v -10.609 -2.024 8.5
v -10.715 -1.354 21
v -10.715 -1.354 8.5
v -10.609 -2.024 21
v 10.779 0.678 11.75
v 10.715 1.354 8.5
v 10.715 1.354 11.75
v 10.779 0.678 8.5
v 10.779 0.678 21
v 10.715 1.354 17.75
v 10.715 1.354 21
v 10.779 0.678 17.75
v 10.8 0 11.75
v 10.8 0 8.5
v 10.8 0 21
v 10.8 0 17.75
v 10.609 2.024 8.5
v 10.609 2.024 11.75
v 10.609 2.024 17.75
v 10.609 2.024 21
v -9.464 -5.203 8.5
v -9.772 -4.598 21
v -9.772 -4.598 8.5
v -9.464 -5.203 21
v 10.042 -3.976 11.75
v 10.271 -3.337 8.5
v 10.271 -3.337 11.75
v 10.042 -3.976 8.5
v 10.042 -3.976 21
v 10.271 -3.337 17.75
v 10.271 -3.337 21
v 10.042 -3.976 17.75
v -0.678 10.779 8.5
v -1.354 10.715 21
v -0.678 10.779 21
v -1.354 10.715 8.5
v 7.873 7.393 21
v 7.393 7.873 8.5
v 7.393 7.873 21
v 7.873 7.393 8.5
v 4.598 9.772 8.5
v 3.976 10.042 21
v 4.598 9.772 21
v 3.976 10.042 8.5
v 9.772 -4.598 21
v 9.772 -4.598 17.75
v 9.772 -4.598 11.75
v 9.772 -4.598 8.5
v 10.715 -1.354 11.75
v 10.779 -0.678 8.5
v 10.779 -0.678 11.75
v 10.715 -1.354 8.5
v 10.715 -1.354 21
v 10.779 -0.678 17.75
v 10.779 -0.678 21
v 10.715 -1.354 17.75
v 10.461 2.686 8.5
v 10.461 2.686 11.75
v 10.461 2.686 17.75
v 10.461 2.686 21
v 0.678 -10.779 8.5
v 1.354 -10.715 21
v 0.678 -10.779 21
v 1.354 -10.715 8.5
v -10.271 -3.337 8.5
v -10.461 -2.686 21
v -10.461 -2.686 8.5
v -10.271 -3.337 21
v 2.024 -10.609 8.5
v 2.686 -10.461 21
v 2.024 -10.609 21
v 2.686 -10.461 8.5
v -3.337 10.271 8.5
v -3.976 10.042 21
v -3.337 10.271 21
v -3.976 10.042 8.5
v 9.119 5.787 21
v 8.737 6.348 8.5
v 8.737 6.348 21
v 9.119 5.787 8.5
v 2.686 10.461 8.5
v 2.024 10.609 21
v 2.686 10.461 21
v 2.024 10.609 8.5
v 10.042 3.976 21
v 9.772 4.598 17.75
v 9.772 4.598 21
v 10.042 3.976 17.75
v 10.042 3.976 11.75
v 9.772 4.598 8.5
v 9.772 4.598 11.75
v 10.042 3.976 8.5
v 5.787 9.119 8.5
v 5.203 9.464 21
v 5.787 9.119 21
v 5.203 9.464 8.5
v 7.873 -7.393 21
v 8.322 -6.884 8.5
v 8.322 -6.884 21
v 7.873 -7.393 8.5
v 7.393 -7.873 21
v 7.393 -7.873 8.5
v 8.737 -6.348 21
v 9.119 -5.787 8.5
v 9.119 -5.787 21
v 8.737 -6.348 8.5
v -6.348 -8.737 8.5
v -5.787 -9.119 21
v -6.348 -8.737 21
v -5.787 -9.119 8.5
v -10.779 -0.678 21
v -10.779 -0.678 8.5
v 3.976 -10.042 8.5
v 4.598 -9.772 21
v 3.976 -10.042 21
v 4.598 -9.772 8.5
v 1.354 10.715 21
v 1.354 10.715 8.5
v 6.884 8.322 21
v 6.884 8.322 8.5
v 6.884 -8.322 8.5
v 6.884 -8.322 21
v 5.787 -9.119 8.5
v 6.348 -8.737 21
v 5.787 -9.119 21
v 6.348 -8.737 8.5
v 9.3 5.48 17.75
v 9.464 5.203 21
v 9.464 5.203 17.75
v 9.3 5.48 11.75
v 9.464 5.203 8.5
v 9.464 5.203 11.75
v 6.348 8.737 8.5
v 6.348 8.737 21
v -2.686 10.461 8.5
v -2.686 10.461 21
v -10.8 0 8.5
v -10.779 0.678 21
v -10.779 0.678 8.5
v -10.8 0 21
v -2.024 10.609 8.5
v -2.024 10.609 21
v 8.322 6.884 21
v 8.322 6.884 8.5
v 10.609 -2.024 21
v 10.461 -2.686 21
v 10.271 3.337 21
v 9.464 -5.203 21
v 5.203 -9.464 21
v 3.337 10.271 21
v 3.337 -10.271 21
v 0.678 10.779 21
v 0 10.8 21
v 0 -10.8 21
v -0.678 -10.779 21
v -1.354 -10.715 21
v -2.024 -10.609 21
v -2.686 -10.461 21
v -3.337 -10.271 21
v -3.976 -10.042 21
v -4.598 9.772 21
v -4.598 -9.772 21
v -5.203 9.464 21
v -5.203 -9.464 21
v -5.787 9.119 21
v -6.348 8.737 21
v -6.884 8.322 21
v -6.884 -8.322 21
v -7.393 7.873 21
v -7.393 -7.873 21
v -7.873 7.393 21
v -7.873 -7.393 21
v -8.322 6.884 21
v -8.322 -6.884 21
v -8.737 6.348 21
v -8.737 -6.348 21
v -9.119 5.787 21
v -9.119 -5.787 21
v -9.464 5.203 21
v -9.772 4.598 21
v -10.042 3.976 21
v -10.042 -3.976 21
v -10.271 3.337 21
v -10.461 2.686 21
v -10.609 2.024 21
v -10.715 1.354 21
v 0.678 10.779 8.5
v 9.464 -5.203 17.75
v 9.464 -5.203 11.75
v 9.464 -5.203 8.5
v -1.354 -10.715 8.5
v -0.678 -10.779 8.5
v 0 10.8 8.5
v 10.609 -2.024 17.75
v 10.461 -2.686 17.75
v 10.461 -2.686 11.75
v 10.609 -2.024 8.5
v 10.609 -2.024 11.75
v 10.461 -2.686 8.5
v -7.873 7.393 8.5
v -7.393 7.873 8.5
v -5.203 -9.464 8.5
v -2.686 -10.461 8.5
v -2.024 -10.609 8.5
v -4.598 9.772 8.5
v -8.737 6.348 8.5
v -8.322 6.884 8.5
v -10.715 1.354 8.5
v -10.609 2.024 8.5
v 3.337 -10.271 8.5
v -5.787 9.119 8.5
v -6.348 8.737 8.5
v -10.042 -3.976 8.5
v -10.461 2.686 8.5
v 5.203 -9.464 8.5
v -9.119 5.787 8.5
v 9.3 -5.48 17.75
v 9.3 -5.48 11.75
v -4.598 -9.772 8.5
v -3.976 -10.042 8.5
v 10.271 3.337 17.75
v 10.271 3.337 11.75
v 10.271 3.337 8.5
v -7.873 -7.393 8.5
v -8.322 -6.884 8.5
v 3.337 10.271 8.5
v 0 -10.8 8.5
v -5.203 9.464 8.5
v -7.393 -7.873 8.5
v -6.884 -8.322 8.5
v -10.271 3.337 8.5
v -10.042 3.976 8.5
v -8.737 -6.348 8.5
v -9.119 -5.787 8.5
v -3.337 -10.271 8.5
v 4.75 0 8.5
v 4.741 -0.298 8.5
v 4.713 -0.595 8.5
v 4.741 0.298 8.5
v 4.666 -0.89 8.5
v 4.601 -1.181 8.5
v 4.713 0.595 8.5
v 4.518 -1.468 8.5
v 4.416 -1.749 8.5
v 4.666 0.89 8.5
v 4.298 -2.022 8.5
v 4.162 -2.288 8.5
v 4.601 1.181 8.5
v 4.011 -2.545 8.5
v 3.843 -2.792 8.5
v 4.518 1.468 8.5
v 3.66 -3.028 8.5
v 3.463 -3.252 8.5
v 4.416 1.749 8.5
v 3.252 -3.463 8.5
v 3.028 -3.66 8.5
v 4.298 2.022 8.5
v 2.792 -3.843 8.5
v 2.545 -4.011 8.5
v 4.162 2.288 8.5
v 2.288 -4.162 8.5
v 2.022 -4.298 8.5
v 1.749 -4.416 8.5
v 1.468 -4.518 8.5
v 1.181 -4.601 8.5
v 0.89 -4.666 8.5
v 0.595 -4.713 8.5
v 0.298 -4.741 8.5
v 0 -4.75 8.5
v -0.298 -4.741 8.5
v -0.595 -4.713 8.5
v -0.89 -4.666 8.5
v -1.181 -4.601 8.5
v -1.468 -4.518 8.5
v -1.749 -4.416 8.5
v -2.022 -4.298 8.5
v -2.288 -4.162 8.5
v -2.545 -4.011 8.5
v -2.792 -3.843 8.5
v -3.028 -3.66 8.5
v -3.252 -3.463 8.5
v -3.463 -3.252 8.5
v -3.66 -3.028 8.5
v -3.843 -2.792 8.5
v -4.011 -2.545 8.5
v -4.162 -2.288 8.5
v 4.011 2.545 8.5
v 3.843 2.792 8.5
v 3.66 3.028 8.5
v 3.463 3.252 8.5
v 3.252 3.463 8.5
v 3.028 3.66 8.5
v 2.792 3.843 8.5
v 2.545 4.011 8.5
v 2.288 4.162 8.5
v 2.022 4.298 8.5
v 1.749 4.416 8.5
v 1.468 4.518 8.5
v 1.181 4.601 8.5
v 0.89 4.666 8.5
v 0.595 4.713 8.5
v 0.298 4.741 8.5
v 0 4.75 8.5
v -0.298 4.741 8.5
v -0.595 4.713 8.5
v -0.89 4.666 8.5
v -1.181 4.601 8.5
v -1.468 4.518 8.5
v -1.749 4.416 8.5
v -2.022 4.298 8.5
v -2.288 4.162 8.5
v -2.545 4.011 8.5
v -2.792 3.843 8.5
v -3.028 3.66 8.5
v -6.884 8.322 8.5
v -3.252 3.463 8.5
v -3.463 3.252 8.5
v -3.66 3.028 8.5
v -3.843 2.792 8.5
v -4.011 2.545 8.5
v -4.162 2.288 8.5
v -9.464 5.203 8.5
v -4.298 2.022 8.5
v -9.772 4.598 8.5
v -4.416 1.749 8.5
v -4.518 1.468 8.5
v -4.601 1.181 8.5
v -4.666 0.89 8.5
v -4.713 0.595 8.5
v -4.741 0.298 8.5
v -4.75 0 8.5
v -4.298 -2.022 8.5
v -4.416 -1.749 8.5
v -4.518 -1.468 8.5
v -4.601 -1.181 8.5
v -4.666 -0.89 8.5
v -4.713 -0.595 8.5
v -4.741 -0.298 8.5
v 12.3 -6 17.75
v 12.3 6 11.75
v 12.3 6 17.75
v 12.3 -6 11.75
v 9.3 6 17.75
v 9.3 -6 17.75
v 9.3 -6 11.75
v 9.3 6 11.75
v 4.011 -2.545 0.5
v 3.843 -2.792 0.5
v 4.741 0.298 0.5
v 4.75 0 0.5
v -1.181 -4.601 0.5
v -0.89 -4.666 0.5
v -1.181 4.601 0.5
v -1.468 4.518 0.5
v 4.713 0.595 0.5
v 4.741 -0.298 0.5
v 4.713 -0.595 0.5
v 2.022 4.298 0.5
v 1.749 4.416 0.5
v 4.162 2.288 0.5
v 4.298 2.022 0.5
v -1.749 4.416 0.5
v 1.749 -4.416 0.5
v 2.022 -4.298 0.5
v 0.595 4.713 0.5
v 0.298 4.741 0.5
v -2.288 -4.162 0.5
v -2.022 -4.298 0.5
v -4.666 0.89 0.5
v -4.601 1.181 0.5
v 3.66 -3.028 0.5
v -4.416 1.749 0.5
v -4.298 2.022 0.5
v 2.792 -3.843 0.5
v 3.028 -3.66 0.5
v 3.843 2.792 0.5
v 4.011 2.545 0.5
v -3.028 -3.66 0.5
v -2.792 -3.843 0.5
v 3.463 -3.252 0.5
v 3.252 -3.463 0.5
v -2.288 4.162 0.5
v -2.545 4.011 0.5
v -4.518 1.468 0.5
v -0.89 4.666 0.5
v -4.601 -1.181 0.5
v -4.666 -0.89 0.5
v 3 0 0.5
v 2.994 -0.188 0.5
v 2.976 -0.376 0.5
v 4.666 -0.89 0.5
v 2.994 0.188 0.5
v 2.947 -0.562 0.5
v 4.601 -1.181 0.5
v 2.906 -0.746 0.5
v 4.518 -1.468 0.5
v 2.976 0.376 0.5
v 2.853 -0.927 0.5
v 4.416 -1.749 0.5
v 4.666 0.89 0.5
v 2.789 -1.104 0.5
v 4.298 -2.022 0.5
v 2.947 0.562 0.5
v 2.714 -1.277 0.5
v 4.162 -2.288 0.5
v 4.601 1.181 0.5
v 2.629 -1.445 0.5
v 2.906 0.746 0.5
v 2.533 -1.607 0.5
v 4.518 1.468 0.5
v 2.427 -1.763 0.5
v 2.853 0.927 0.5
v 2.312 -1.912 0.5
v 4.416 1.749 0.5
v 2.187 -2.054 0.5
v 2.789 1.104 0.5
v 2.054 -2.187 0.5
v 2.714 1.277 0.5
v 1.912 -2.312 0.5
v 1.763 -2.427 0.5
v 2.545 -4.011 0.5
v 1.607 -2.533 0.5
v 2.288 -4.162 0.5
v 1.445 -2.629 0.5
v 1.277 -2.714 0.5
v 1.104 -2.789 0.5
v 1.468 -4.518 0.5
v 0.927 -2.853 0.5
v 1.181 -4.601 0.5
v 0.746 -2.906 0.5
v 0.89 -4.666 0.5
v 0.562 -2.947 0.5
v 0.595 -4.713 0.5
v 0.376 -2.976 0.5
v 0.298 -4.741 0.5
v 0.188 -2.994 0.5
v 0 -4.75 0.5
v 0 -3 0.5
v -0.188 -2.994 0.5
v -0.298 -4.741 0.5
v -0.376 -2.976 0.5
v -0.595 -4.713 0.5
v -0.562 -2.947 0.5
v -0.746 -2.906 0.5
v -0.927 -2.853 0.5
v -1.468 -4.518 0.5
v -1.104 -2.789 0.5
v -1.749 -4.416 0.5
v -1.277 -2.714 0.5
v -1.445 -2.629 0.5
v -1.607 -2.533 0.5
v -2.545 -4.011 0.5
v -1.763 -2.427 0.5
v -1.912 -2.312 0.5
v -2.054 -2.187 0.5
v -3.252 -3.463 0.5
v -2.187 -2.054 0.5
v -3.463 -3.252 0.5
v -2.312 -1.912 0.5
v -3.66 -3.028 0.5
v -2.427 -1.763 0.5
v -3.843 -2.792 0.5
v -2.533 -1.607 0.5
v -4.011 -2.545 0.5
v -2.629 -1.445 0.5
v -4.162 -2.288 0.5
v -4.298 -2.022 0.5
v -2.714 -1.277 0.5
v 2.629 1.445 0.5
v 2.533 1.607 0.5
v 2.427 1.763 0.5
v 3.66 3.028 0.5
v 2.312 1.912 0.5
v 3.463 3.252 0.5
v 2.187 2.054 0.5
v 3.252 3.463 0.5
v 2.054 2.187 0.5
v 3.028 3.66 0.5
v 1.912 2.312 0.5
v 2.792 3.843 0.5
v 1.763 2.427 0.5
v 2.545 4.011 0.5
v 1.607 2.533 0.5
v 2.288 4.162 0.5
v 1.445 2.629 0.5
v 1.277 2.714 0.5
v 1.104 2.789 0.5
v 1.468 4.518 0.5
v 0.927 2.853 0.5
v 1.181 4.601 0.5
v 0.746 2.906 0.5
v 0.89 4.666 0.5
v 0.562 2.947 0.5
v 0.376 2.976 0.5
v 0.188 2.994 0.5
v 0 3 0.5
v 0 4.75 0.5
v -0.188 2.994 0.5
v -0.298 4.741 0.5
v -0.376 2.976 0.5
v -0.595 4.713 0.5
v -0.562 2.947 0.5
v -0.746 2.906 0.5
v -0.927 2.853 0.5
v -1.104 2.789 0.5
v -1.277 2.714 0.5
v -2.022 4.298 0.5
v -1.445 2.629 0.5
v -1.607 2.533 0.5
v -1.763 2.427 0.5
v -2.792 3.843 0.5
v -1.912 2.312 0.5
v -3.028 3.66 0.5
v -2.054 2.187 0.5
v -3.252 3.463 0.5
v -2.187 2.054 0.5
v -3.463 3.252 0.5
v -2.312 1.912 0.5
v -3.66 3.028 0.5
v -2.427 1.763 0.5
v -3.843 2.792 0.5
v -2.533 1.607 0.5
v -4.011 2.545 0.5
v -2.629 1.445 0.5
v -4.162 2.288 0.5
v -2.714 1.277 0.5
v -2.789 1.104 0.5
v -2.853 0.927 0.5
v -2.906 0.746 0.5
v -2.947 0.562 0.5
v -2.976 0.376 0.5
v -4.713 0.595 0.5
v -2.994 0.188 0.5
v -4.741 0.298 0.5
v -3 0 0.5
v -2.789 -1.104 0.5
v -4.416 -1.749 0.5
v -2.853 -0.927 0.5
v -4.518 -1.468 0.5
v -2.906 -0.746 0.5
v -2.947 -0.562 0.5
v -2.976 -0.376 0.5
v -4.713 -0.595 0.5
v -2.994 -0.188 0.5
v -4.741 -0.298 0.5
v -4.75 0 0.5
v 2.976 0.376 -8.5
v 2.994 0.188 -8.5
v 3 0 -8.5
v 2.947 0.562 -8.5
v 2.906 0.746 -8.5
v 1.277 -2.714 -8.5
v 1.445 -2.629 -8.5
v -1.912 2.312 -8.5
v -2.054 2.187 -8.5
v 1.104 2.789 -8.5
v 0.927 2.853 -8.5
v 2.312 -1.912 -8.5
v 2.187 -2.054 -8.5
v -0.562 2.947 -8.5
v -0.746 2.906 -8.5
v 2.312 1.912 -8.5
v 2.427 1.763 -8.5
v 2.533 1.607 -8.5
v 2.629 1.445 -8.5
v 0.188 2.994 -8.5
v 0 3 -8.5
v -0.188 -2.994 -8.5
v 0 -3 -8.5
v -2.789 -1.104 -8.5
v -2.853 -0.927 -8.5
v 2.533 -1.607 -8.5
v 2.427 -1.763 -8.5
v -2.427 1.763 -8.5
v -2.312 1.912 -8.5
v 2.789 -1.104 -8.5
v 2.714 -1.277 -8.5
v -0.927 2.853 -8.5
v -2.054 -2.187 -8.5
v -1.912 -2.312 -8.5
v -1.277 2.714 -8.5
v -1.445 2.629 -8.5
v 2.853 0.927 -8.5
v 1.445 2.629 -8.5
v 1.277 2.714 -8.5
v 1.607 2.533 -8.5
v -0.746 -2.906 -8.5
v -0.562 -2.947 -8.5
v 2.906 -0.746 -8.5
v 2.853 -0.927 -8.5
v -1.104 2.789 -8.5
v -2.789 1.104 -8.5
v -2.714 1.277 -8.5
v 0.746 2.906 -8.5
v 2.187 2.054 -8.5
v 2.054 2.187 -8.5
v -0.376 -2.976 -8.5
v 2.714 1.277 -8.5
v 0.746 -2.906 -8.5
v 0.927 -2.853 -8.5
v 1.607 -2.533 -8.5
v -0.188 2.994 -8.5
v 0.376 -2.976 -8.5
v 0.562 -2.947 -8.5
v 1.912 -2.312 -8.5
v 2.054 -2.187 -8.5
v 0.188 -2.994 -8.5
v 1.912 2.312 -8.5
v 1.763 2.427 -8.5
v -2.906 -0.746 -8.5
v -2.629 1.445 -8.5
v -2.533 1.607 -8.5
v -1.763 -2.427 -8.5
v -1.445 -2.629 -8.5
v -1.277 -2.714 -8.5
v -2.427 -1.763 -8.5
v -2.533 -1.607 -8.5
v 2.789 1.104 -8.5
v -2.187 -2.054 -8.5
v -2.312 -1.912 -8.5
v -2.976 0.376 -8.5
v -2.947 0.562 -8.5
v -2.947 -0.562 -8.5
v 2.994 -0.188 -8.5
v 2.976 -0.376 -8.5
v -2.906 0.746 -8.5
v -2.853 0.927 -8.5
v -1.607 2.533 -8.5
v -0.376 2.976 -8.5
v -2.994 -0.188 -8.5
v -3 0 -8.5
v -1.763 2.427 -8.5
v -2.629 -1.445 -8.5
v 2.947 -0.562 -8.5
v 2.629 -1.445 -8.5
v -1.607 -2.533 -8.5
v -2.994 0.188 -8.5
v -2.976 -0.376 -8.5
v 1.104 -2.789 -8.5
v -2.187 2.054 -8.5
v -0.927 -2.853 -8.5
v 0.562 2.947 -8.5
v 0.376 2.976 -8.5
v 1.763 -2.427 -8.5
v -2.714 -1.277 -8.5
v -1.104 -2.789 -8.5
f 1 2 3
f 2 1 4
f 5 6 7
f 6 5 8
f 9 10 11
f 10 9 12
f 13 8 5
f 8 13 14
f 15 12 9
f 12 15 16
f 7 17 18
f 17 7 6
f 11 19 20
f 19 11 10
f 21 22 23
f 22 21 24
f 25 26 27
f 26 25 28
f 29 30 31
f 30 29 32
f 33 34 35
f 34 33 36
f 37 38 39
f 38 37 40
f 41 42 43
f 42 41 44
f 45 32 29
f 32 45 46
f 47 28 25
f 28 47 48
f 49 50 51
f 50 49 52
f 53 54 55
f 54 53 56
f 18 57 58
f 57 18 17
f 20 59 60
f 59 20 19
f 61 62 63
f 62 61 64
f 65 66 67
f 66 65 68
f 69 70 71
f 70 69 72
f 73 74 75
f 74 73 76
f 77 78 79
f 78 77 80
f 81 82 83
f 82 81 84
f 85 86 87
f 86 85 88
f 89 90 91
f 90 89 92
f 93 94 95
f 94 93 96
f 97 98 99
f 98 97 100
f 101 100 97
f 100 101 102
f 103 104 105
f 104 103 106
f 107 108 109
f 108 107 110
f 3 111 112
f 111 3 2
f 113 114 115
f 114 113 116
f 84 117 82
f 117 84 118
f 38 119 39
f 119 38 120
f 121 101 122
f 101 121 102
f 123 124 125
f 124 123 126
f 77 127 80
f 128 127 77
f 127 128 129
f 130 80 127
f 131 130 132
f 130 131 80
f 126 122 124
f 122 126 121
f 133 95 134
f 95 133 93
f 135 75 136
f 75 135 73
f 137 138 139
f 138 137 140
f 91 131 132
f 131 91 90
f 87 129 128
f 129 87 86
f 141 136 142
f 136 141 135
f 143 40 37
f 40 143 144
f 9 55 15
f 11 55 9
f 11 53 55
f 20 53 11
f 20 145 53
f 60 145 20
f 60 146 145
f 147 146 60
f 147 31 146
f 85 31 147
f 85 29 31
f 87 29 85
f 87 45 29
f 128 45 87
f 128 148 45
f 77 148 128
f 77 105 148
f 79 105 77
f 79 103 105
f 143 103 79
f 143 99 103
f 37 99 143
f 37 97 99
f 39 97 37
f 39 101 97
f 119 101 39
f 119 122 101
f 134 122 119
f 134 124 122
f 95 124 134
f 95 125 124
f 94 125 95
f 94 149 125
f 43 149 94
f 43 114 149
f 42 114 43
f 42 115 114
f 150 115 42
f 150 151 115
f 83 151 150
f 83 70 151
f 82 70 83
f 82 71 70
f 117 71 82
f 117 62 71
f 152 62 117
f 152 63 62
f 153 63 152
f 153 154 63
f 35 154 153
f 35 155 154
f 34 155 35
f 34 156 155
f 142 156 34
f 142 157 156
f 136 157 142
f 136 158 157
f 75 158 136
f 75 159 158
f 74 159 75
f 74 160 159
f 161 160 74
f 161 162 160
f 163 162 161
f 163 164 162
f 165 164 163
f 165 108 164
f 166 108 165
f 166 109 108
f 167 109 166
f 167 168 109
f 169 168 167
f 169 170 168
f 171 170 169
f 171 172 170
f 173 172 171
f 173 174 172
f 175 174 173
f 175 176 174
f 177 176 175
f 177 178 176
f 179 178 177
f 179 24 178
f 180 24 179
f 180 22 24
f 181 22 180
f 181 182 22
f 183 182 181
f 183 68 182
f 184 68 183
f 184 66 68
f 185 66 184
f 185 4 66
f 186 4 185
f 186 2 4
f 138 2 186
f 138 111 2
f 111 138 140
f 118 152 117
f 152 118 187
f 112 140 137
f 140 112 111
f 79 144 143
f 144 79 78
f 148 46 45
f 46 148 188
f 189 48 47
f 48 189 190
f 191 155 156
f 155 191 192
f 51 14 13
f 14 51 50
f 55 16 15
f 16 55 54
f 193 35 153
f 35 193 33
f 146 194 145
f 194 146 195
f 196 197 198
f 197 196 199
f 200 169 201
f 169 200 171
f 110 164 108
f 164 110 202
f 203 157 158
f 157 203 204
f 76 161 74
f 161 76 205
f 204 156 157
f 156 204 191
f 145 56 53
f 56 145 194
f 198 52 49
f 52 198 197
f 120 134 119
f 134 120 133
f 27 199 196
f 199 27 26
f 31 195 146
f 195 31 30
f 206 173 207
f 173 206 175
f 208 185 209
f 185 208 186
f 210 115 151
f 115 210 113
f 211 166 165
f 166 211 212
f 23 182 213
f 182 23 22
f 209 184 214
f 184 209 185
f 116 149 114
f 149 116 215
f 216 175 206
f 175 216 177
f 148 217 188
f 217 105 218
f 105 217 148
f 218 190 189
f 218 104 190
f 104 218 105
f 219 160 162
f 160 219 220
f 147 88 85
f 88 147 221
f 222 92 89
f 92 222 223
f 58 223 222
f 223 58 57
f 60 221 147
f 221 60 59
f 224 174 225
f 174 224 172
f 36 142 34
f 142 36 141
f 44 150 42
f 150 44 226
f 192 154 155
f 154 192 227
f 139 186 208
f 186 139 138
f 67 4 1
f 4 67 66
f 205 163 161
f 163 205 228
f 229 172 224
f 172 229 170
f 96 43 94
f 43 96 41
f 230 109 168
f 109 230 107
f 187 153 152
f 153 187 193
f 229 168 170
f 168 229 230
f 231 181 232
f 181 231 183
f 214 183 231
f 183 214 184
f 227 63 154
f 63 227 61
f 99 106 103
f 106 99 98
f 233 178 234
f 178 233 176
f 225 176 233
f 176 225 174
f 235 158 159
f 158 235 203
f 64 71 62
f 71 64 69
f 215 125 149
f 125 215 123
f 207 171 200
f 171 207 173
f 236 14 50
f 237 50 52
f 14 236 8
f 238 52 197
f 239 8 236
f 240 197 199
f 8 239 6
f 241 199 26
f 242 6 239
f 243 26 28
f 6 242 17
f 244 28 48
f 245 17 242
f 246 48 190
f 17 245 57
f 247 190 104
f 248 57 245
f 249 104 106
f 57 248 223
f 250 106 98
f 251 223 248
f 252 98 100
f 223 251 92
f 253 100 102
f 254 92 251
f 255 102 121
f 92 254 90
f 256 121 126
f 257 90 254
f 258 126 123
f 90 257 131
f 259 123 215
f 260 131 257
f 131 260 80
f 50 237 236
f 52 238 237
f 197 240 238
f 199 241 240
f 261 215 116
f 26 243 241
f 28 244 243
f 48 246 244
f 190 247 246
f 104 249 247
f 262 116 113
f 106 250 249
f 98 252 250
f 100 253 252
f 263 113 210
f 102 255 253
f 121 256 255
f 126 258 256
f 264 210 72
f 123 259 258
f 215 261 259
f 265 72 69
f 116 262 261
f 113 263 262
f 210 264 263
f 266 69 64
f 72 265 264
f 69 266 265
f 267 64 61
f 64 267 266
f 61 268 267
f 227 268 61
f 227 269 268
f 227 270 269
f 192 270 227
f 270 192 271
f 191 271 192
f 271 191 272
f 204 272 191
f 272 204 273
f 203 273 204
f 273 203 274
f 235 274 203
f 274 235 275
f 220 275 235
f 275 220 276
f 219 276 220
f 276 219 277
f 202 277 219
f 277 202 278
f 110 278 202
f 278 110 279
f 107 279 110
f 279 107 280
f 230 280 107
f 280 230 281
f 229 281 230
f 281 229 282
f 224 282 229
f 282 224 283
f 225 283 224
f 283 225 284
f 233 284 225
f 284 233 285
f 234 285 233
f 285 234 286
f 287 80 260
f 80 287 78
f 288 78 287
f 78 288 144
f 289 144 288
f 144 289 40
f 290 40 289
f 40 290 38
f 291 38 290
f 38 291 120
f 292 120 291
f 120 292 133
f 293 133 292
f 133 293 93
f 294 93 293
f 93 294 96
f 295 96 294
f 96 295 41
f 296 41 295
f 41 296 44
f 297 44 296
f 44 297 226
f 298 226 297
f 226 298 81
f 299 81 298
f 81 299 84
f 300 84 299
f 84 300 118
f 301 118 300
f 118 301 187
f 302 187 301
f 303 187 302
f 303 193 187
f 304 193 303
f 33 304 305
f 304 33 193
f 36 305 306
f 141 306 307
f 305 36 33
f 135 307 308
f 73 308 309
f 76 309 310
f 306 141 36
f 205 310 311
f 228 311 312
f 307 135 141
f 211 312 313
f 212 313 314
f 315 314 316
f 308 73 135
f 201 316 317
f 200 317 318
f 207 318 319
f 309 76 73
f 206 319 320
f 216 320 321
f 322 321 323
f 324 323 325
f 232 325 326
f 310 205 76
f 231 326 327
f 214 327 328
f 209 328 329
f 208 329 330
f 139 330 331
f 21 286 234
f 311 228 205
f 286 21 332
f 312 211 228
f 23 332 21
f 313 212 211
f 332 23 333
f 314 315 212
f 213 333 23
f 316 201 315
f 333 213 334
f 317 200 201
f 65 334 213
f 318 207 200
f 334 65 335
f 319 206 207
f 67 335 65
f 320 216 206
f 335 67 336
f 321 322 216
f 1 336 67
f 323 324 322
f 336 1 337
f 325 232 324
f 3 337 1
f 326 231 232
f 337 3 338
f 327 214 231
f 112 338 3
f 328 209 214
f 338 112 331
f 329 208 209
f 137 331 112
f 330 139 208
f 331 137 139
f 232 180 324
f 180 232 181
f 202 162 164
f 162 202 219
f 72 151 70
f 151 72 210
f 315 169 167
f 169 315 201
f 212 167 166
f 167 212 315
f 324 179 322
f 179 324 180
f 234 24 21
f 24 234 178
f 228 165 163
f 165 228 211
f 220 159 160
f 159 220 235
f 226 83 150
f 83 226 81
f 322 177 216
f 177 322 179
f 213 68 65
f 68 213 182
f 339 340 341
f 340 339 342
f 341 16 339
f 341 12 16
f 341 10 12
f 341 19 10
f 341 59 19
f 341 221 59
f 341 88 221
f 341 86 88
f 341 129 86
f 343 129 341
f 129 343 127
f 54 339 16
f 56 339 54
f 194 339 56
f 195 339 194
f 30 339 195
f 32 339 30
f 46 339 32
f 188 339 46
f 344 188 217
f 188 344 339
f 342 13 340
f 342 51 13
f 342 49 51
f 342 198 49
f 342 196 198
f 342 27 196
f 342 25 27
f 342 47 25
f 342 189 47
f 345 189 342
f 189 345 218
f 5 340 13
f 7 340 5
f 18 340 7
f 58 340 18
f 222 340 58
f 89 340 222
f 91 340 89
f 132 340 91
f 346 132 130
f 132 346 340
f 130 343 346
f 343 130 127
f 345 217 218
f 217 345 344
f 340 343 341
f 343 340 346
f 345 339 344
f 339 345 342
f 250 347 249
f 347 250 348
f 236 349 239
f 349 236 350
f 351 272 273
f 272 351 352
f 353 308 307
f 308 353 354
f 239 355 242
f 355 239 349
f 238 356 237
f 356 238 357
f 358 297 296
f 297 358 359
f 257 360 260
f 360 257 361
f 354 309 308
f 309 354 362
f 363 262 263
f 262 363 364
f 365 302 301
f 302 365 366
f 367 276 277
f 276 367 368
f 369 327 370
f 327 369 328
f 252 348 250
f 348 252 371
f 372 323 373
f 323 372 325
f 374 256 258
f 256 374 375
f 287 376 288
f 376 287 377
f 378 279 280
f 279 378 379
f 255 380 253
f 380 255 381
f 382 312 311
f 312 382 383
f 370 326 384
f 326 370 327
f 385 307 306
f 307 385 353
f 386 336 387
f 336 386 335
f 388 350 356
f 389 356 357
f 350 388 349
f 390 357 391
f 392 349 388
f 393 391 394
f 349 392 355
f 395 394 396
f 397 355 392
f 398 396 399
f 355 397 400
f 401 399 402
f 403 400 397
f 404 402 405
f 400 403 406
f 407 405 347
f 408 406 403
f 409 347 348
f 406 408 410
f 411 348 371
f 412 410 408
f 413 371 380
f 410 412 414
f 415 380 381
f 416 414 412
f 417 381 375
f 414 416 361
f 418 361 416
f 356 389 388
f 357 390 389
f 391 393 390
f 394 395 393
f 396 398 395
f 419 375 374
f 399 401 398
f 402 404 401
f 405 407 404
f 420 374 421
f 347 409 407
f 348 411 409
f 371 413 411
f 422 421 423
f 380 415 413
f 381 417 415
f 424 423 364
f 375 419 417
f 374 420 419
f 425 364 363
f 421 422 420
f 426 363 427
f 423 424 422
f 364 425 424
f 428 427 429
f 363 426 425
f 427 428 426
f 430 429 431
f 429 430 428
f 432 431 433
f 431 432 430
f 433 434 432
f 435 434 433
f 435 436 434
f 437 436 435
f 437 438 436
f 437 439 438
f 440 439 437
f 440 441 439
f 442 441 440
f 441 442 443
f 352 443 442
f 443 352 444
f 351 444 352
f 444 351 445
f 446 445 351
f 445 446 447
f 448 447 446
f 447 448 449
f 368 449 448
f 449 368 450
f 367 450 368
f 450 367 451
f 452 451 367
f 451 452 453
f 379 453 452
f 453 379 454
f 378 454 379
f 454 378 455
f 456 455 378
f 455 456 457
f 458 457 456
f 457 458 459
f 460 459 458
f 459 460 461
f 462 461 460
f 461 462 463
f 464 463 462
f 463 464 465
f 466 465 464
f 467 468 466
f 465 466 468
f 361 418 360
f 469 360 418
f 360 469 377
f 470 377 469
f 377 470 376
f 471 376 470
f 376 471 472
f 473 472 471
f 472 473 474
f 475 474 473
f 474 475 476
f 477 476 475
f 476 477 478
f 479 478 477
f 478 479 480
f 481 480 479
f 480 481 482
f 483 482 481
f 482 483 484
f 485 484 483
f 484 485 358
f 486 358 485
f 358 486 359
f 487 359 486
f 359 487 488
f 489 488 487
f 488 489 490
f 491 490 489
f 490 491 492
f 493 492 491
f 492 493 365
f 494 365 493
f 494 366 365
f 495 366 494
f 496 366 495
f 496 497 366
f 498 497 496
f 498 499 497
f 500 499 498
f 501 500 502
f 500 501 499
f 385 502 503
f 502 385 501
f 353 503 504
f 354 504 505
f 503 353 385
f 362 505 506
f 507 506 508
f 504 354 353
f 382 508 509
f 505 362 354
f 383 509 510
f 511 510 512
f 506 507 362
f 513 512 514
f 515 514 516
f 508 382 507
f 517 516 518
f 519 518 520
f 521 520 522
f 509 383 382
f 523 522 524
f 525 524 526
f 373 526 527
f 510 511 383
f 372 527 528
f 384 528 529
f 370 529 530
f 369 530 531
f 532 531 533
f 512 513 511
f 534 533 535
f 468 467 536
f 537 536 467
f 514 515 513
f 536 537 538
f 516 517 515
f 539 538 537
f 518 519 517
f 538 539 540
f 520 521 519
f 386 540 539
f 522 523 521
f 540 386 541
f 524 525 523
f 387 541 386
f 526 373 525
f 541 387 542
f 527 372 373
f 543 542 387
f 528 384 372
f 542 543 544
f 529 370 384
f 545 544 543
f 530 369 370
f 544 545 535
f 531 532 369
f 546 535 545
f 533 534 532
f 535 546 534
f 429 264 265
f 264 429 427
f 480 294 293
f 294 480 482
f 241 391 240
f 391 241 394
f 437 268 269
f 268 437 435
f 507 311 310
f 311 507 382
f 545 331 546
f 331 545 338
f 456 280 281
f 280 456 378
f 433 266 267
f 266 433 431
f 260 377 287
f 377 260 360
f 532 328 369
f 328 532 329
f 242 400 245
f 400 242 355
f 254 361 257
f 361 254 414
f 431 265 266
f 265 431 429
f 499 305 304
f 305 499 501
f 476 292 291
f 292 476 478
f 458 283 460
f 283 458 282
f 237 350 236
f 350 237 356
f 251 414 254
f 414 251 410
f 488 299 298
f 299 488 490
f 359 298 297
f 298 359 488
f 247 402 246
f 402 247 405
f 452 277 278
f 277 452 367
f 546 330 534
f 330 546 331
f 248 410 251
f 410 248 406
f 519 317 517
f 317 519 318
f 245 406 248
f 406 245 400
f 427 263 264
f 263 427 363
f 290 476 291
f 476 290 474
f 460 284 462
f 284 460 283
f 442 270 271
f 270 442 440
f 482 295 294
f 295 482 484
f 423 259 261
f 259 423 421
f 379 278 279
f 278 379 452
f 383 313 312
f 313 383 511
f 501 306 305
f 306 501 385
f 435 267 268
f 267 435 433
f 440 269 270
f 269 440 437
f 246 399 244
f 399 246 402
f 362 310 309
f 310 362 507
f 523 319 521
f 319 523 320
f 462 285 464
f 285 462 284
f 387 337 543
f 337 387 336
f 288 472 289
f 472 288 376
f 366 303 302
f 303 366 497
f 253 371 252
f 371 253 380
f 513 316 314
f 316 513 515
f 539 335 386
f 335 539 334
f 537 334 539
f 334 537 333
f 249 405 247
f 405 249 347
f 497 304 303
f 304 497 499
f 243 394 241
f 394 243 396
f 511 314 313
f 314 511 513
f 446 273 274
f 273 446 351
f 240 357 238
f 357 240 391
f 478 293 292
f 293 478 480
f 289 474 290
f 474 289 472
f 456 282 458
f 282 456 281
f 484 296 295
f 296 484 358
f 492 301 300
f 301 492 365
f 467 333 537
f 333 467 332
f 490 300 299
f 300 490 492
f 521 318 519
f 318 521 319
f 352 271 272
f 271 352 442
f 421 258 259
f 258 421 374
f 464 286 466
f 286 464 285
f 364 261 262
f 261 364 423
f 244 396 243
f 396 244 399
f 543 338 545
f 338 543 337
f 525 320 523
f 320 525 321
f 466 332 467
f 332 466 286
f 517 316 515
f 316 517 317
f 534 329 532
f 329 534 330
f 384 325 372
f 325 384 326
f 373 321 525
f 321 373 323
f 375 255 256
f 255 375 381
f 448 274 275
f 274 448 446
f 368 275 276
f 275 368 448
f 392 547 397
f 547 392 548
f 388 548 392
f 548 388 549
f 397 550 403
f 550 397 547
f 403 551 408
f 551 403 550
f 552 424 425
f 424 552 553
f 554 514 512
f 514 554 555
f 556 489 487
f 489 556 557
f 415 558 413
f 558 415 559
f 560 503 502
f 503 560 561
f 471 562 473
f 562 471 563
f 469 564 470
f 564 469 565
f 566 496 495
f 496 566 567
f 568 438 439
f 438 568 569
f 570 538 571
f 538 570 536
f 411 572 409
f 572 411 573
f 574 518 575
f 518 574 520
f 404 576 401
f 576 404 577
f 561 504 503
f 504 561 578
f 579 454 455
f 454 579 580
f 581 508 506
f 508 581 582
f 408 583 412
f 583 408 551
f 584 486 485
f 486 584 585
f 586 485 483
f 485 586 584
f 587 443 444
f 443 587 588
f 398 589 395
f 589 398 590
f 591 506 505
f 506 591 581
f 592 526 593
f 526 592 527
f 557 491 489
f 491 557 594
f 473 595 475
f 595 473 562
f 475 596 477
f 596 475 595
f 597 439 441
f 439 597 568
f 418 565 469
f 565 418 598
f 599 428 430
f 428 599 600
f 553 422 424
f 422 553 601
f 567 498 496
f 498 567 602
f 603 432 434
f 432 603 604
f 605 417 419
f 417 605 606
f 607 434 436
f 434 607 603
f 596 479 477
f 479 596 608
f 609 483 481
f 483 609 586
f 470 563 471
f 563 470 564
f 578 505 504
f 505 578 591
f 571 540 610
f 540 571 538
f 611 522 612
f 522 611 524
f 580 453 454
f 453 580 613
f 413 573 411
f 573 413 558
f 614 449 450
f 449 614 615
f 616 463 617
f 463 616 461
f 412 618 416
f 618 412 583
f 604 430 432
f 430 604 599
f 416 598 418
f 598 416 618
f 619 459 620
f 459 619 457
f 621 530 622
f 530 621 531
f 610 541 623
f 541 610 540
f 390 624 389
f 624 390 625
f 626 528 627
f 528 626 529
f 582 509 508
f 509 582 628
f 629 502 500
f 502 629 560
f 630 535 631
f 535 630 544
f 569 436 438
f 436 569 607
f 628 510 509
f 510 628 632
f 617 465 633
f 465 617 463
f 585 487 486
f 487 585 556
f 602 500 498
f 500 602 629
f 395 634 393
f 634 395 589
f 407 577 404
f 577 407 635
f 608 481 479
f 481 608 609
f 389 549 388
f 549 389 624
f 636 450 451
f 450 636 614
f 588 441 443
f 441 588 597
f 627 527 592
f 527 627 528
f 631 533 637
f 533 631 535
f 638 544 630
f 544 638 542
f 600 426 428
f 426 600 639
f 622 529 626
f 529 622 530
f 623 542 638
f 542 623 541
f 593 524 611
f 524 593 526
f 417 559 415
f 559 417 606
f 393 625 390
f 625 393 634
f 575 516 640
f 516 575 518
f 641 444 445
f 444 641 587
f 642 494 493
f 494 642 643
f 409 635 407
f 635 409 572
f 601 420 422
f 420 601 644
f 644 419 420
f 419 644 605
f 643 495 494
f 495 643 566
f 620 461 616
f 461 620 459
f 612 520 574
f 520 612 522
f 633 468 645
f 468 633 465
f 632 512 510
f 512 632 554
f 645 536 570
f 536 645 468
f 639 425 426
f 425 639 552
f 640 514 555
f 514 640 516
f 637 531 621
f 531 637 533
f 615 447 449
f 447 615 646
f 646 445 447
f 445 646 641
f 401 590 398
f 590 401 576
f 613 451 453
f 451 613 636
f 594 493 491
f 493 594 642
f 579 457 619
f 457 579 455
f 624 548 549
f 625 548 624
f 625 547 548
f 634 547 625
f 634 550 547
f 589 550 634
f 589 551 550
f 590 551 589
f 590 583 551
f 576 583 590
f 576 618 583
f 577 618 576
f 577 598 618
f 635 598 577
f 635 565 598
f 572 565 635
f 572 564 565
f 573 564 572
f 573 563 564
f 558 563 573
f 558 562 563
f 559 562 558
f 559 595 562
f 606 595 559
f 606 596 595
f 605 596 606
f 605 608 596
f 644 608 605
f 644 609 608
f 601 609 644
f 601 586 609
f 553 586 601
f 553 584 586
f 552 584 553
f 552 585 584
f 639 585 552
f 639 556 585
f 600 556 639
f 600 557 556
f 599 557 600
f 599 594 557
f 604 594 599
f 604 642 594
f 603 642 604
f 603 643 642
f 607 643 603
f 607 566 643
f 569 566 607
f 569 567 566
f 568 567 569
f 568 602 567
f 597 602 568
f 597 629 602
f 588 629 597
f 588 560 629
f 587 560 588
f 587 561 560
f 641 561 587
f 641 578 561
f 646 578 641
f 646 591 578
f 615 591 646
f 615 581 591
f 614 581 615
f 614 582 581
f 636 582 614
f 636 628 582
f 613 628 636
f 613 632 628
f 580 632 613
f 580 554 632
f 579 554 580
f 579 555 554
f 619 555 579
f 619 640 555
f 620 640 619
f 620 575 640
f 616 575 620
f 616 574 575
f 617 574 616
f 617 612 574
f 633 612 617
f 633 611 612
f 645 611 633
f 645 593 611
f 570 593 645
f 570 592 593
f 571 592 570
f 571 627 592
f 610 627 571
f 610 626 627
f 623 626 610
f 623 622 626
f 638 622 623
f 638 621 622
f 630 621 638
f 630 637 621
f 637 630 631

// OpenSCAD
$fn=100;
codeur_diametre = 21.6;
codeur_epaisseur = 12.5;
diametre_axe = 6;
diametre_filetage = 9.5;
longueur_filetage = 8;
longueur_axe = 9;

module codeur_optique() {
    // Axe
	translate([0,0,0.5])cylinder(d=diametre_filetage,h=longueur_filetage);
	translate([0,0,-(longueur_filetage+0.5)])cylinder(d=diametre_axe,h=longueur_axe);
    // Codeur
	translate([0,0,longueur_filetage+0.5]) {
        cylinder(d=codeur_diametre, h=codeur_epaisseur);
        translate([codeur_diametre/2,0,codeur_epaisseur/2])
            cube(center=true, [3,12,6]);
    }
}

codeur_optique();
